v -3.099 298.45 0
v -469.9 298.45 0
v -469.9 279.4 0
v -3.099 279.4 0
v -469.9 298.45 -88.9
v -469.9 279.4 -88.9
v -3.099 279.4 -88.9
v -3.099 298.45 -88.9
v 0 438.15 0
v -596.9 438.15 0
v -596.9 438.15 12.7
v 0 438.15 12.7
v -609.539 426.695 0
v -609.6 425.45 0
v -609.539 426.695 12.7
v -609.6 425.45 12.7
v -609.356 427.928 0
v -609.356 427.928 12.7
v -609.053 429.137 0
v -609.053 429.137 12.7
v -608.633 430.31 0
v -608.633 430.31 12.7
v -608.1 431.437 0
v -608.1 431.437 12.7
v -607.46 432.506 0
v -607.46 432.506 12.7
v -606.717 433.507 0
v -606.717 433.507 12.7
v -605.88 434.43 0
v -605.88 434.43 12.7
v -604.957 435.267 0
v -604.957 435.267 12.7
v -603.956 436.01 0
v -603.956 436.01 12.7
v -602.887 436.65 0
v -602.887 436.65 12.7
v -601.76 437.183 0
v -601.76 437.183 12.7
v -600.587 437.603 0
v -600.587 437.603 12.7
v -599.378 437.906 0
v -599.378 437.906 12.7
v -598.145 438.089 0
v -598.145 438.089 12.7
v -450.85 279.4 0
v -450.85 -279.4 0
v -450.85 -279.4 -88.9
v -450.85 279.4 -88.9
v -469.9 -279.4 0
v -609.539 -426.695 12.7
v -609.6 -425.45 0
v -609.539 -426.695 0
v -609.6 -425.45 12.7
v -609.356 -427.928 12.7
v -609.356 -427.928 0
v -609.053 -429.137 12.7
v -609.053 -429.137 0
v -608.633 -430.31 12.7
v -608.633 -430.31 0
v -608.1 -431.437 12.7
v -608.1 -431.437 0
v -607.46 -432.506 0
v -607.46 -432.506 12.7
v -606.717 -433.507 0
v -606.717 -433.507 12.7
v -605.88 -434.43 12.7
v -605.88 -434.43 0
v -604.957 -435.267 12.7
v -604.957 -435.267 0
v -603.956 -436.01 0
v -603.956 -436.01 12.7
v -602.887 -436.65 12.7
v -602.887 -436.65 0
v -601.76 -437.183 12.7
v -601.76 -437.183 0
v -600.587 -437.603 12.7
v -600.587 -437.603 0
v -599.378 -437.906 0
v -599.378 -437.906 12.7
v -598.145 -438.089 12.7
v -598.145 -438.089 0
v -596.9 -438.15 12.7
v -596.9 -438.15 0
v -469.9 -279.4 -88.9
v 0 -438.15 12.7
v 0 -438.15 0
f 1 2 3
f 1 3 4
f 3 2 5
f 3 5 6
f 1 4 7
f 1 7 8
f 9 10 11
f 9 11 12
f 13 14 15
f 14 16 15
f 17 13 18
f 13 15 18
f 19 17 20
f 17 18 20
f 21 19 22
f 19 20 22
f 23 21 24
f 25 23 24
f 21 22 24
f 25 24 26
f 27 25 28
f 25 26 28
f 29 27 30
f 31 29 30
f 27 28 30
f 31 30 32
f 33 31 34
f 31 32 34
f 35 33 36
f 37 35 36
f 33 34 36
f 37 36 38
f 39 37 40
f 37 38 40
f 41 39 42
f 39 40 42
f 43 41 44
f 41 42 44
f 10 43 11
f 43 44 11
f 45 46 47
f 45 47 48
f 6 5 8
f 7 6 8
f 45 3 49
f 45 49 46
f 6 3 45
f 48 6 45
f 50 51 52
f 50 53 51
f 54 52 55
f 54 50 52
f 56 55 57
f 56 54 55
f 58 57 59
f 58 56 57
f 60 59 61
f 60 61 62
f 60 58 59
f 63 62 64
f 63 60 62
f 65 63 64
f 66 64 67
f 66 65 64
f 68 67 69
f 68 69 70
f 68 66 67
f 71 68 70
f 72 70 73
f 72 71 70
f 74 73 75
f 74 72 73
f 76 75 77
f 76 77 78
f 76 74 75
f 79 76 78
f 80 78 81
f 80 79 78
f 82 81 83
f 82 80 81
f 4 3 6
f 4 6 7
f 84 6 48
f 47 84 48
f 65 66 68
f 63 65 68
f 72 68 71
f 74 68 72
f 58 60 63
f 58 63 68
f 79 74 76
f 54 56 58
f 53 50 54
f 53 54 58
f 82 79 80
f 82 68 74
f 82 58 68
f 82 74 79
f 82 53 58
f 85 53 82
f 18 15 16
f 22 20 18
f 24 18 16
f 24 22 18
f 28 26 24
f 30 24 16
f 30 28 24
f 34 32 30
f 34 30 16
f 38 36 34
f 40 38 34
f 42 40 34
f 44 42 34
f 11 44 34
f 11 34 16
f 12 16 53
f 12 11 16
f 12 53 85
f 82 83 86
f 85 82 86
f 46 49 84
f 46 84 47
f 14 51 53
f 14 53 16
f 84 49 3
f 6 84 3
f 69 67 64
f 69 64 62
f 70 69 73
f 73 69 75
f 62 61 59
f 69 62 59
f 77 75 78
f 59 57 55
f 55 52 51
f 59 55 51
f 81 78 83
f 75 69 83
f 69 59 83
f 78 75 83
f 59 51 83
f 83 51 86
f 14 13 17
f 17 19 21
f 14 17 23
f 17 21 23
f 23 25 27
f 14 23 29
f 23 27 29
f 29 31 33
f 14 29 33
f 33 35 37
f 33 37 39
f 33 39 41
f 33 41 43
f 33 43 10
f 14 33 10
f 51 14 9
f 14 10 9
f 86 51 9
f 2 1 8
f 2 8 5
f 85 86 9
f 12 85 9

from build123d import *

# Parameters (mm, degrees)
F1_DEPTH = 88.9
F0_W     = 19.05
F0_H     = 558.8
F2_DEPTH = 88.9
F3_W     = 609.6
F3_H     = 876.3
F4_DEPTH = 12.7
F5_R     = 12.7


with BuildPart() as f1:
    # F0 (on Top) → F1 (new body)
    with BuildSketch(Plane.XY):
        Polygon((-469.9, 298.45), (-469.9, 279.4), (-450.85, 279.4), (-22.1488, 279.4), (-3.0988, 279.4), (-3.0988, 298.45), align=None)
    extrude(amount=-F1_DEPTH)


with BuildPart() as f2:
    # F0 (on Top) → F2 (new body, through all)
    with BuildSketch(Plane.XY):
        with Locations((-460.375, 0)):
            Rectangle(F0_W, F0_H)
    extrude(amount=-F2_DEPTH)


with BuildPart() as f4:
    # F3 (on Top) → F4 (new body)
    with BuildSketch(Plane.XY):
        with Locations((-304.8, 0)):
            Rectangle(F3_W, F3_H)
    extrude(amount=F4_DEPTH)

    # F5
    f5_edges = [f4.edges().sort_by_distance(p)[0] for p in [
        (-609.6, -438.15, 6.35),
        (-609.6, 438.15, 6.35),
    ]]
    fillet(f5_edges, radius=F5_R)


solid = Compound([f1.part, f2.part, f4.part])
